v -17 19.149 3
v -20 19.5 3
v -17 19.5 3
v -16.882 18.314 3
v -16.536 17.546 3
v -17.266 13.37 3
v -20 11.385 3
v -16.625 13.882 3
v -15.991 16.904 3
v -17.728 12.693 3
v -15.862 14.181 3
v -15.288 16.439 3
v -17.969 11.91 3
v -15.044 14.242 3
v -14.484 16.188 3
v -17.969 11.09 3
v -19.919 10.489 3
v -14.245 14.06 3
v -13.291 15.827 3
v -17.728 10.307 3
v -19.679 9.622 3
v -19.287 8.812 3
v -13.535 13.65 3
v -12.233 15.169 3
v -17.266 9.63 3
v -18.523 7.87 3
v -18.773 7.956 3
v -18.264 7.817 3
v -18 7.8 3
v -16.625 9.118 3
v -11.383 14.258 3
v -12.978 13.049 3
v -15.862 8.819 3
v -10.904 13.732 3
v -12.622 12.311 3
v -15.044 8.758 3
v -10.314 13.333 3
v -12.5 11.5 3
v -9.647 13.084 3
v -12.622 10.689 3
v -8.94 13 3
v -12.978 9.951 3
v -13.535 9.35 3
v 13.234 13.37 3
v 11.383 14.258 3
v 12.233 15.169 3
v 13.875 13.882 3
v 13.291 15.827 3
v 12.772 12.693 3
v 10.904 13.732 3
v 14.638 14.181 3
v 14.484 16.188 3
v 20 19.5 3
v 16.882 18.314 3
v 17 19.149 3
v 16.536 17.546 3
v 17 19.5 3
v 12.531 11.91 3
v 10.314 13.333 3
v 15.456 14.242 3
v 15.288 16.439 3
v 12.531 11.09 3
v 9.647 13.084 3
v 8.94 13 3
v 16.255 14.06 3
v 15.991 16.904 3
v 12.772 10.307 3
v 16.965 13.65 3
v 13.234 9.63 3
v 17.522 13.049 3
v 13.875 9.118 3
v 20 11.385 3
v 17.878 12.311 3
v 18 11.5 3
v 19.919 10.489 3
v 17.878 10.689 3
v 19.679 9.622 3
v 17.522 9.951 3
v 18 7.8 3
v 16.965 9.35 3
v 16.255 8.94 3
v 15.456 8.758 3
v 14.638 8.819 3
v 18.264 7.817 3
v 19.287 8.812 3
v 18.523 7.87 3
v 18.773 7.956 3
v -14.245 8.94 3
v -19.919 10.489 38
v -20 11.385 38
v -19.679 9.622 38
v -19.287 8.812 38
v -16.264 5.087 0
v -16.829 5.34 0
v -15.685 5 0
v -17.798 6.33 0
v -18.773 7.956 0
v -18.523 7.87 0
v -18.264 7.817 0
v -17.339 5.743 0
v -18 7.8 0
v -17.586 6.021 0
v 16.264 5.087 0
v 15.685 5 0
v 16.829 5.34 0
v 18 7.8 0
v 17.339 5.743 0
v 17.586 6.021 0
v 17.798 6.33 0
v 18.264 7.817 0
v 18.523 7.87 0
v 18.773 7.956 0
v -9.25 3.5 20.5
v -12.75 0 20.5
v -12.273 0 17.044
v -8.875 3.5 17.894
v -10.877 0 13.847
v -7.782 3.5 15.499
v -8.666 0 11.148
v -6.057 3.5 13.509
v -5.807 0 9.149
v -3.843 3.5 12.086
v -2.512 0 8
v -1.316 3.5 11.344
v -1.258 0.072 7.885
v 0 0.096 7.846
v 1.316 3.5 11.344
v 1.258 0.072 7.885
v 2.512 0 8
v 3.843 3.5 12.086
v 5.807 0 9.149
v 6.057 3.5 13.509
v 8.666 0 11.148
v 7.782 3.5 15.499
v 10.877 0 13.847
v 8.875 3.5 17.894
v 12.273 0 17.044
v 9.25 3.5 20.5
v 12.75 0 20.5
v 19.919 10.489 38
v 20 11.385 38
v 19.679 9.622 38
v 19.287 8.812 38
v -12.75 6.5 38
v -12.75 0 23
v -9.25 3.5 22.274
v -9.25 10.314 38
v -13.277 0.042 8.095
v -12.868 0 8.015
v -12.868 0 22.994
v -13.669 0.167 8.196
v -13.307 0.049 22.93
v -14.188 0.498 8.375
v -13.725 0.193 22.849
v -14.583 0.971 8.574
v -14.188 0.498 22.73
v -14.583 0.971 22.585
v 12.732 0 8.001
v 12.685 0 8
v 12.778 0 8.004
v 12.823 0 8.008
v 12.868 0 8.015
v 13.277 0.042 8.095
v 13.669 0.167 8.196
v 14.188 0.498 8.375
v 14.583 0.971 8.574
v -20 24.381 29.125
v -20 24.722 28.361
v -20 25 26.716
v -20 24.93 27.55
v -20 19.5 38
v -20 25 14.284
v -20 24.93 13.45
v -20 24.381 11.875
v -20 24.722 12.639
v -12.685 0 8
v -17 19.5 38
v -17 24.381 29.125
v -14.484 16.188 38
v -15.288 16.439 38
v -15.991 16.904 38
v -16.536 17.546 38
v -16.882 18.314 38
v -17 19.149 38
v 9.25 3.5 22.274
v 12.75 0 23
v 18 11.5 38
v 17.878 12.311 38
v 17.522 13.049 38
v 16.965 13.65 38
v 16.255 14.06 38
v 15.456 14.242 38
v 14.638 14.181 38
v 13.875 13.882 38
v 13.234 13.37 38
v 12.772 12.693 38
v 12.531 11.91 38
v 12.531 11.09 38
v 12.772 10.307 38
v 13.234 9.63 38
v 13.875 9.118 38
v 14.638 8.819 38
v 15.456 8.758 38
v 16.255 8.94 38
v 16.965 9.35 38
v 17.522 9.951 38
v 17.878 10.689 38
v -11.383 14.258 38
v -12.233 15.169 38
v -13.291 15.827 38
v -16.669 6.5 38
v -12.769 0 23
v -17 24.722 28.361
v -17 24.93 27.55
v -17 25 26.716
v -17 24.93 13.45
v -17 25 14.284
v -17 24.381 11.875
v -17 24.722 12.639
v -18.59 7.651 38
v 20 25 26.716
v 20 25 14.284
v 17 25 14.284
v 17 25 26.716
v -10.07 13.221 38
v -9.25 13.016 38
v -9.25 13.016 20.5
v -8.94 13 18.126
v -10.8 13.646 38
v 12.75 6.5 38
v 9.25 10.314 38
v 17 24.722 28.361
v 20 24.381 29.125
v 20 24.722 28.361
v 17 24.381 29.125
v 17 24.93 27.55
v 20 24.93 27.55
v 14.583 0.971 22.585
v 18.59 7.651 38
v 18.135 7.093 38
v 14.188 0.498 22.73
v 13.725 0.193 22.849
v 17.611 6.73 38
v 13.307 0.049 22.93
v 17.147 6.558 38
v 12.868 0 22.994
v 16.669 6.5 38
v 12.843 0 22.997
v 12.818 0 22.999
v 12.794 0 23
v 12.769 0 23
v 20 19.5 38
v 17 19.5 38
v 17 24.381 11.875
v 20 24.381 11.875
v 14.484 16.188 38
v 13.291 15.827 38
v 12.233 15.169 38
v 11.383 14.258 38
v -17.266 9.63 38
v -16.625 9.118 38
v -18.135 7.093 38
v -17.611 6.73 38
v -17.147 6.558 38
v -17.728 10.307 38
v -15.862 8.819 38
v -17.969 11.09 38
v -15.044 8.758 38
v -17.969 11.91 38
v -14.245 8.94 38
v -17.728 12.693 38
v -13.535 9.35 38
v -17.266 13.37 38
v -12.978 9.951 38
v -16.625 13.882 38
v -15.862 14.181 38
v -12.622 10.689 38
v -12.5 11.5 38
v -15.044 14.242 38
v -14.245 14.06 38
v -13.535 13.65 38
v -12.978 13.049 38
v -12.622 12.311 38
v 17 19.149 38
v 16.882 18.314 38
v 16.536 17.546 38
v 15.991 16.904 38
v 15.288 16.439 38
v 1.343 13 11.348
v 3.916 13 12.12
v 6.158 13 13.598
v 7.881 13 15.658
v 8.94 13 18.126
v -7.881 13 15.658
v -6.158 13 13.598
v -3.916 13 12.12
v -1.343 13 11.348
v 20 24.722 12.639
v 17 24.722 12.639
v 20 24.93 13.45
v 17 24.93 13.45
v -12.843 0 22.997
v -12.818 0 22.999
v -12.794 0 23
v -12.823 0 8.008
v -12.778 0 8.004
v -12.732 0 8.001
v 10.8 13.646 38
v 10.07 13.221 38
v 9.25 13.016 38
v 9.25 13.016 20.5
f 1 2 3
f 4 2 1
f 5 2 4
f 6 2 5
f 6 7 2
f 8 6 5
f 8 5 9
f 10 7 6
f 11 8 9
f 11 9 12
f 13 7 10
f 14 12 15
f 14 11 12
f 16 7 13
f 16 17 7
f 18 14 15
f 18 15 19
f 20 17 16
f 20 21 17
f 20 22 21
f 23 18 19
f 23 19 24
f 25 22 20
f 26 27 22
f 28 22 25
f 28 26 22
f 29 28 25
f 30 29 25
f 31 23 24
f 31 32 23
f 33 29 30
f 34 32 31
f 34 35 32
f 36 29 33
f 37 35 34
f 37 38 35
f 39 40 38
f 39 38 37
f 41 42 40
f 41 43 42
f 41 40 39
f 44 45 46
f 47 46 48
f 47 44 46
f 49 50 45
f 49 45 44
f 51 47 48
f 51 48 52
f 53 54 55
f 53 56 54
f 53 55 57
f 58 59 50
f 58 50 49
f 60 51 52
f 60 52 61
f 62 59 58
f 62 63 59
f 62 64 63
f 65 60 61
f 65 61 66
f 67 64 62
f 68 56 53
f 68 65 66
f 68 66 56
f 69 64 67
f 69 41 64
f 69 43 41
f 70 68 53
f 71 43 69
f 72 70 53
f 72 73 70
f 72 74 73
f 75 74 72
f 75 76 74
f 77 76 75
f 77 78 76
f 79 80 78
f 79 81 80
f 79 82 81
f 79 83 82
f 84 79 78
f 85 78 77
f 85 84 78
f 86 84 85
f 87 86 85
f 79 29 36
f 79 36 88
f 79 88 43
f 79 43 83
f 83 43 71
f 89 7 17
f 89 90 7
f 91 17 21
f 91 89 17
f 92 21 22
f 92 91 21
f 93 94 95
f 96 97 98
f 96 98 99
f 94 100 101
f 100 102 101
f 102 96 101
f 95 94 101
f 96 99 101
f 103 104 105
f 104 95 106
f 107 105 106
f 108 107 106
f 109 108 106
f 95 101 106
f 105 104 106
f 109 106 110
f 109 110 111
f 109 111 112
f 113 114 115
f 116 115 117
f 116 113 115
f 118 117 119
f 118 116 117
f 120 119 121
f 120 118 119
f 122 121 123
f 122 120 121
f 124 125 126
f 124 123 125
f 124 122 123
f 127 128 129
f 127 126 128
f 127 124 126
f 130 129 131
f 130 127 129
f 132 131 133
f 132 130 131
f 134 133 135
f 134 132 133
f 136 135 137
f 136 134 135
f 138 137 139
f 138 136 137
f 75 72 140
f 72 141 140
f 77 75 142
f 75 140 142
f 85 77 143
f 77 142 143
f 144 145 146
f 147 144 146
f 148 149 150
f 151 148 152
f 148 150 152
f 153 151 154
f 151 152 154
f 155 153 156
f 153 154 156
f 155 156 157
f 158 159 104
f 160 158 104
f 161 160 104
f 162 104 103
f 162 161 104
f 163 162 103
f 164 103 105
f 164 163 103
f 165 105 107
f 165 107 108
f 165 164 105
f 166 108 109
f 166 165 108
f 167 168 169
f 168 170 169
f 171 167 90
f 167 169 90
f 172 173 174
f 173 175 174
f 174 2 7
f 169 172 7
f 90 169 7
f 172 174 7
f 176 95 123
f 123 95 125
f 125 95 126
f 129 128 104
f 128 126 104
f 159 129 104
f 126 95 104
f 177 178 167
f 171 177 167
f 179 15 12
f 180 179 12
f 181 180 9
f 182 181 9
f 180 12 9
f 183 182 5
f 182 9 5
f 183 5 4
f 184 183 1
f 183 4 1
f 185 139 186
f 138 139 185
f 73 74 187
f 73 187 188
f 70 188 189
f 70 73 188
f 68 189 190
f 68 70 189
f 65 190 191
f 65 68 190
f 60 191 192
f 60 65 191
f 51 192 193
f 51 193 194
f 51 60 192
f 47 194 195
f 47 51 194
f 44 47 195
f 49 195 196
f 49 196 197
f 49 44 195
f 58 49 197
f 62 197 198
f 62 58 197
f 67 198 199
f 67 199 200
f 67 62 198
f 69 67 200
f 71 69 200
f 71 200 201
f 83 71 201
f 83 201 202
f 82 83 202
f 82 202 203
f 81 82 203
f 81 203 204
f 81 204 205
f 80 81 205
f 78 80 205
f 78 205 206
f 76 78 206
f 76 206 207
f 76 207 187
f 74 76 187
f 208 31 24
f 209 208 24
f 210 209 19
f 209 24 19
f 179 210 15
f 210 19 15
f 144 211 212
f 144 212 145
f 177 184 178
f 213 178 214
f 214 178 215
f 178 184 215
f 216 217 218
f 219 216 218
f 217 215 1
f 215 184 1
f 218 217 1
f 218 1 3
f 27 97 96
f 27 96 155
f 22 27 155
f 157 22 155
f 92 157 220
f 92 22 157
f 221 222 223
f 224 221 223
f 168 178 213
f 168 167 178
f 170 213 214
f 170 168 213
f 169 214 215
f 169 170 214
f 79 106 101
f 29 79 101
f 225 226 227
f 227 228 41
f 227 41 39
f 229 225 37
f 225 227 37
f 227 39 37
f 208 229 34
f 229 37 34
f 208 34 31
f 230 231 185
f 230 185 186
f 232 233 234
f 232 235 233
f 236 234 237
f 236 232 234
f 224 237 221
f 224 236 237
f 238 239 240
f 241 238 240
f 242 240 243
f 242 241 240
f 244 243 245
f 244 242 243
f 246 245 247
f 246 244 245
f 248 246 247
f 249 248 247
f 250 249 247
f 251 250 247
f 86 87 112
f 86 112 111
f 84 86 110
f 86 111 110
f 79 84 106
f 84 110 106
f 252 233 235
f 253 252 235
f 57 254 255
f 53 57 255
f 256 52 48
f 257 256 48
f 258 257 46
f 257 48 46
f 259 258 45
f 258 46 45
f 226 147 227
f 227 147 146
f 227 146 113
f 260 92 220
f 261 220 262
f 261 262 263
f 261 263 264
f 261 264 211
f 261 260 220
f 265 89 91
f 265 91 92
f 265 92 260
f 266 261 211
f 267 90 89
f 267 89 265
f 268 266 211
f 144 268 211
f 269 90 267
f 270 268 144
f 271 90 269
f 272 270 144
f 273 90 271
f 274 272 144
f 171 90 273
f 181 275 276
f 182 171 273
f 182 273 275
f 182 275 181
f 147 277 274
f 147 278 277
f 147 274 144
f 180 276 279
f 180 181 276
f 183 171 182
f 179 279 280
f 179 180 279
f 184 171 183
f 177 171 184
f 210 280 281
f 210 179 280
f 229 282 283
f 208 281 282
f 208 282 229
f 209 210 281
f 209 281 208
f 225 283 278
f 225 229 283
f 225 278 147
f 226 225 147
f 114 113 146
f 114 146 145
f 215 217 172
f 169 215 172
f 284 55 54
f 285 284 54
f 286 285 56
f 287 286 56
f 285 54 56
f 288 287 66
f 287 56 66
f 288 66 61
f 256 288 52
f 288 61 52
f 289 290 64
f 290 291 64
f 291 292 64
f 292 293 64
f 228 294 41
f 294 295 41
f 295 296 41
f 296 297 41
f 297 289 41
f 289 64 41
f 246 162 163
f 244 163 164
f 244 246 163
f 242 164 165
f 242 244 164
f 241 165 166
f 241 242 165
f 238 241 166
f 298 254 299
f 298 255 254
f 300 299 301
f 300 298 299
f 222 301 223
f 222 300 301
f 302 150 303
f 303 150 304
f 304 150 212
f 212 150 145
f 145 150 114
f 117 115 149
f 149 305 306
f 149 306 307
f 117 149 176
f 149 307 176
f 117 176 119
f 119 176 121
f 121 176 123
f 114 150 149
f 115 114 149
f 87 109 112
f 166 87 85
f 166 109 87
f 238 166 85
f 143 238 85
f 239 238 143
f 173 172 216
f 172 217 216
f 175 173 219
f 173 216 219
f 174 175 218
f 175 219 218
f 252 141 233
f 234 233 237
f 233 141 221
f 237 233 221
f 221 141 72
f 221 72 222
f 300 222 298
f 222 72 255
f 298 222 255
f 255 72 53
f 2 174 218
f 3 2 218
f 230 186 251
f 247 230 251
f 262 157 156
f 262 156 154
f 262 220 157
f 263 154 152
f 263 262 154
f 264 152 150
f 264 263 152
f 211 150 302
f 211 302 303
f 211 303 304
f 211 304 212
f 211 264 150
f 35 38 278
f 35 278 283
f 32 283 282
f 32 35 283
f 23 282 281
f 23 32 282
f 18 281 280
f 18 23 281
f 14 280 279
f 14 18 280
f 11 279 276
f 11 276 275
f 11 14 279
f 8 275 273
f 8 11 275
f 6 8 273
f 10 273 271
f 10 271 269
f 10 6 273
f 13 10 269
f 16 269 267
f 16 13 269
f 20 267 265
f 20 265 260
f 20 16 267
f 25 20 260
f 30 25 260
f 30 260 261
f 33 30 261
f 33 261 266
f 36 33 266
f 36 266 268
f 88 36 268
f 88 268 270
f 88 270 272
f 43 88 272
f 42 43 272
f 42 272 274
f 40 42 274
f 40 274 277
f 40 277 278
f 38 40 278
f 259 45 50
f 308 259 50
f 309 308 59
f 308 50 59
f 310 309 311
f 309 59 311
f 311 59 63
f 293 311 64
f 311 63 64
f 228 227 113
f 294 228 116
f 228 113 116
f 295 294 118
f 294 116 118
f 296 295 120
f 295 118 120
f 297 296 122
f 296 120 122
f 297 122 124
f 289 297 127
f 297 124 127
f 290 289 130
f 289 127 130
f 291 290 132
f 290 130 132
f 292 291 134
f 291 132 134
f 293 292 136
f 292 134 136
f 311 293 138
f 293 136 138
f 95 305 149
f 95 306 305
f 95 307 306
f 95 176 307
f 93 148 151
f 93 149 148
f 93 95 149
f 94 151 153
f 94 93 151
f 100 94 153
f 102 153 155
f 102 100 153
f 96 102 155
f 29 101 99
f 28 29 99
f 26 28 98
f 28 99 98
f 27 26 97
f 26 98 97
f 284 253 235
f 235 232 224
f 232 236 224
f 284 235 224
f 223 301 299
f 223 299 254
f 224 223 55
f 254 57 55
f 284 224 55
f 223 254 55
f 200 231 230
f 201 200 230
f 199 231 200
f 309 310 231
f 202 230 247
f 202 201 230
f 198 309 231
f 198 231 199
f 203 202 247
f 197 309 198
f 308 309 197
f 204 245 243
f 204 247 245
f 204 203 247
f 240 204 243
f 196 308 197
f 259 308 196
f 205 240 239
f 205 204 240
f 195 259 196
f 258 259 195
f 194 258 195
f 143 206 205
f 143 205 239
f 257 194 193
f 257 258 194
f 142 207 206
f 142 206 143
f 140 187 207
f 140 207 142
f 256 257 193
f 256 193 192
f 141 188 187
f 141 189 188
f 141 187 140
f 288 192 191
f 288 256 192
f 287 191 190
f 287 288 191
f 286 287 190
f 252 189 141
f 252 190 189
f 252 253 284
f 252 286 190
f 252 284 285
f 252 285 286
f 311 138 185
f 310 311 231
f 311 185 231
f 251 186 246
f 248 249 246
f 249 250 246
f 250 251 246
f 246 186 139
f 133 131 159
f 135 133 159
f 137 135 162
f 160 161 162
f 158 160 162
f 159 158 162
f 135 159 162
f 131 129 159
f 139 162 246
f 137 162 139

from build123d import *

# Parameters (mm, degrees)
F0_R         = 2.75
F1_DEPTH     = 38
F3_DEPTH     = 3
F5_DEPTH     = 25
F6_SIZE2     = 5
F6_SIZE      = 8
F7_SIZE2     = 6.5
F7_SIZE      = 15
F8_SIZE2     = 6
F8_SIZE      = 10
F9_SIZE2     = 10
F9_SIZE      = 6
F10_R        = 2
F11_C1_SIZE2 = 10
F11_C1_SIZE  = 5.5
F11_C2_SIZE2 = 10
F11_C2_SIZE  = 5.5
F12_SIZE2    = 5.5
F12_SIZE     = 10
F12_2_SIZE2  = 5.5
F12_2_SIZE   = 10
F13_R        = 5
F14_R        = 5
F15_T1_DEPTH = 34.34956364
F15_T3_DEPTH = 11.5008904579
F15_T6_ANGLE = 180


# Not quite as in the source:
# - a fillet or chamfer that OpenCascade refuses, or shapes differently, is made with other operations: its cross-section is extruded or revolved along the edge and cut away or added


with BuildPart() as f1:
    # F0 (on Top) → F1 (new body)
    with BuildSketch(Plane.XY):
        with BuildLine():
            Line((-17, 25), (-20, 25))
            Line((-20, 25), (-20, 0))
            Line((-20, 0), (20, 0))
            Line((20, 0), (20, 25))
            Line((20, 25), (17, 25))
            Line((17, 25), (17, 19.1485292704))
            ThreePointArc((17, 19.1485292704), (16.286002286, 17.205800893), (14.4838709677, 16.1878082625))
            ThreePointArc((14.4838709677, 16.1878082625), (12.7404153064, 15.5329250756), (11.3827554868, 14.2580645161))
            ThreePointArc((11.3827554868, 14.2580645161), (10.3140016776, 13.332997333), (8.9402852679, 13))
            Line((8.9402852679, 13), (-8.9402852679, 13))
            ThreePointArc((-8.9402852679, 13), (-10.3140016776, 13.332997333), (-11.3827554868, 14.2580645161))
            ThreePointArc((-11.3827554868, 14.2580645161), (-12.7404153064, 15.5329250756), (-14.4838709677, 16.1878082625))
            ThreePointArc((-14.4838709677, 16.1878082625), (-16.286002286, 17.205800893), (-17, 19.1485292704))
            Line((-17, 19.1485292704), (-17, 25))
        make_face()
        with Locations((-15.25, 11.5)):
            Circle(F0_R, mode=Mode.SUBTRACT)
        with Locations((15.25, 11.5)):
            Circle(F0_R, mode=Mode.SUBTRACT)
    extrude(amount=F1_DEPTH)

    # F2 (on face) → F3 (cut)
    with BuildSketch(Plane(origin=(0, 0, 0), x_dir=(1, 0, 0), z_dir=(0, 0, -1))):
        with BuildLine():
            Line((18, -7.8), (-18, -7.8))
            ThreePointArc((-18, -7.8), (-19.4142135624, -8.3857864376), (-20, -9.8))
            Line((-20, -9.8), (-20, -60))
            Line((-20, -60), (20, -60))
            Line((20, -60), (20, -9.8))
            ThreePointArc((20, -9.8), (19.4142135624, -8.3857864376), (18, -7.8))
        make_face()
    extrude(amount=-F3_DEPTH, mode=Mode.SUBTRACT)

    # F4 (on face) → F5 (cut)
    with BuildSketch(Plane.XZ):
        with BuildLine():
            Line((-9.25, 38), (-9.25, 20.5))
            ThreePointArc((-9.25, 20.5), (0, 11.25), (9.25, 20.5))
            Line((9.25, 20.5), (9.25, 38))
            Line((9.25, 38), (-9.25, 38))
        make_face()
    extrude(amount=-F5_DEPTH, mode=Mode.SUBTRACT)

    # F6
    f6_edges = [f1.edges().sort_by_distance(p)[0] for p in [
        (0, 0, 0),
    ]]
    f6_side = f1.faces().sort_by_distance((0, 0, 0.551725))[0]
    chamfer(f6_edges, length=F6_SIZE, length2=F6_SIZE2, reference=f6_side)

    # F7
    f7_edges = [f1.edges().sort_by_distance(p)[0] for p in [
        (-14.625, 0, 38),
        (14.625, 0, 38),
    ]]
    f7_side = f1.faces().sort_by_distance((19.5, 0, 23))[0]
    chamfer(f7_edges, length=F7_SIZE, length2=F7_SIZE2, reference=f7_side)

    # F8
    f8_edges = [f1.edges().sort_by_distance(p)[0] for p in [
        (20, 0, 15.5),
    ]]
    f8_side = f1.faces().sort_by_distance((20, 13.094719, 19.529129))[0]
    chamfer(f8_edges, length=F8_SIZE, length2=F8_SIZE2, reference=f8_side)

    # F9
    f9_edges = [f1.edges().sort_by_distance(p)[0] for p in [
        (-20, 0, 15.5),
    ]]
    f9_side = f1.faces().sort_by_distance((11.625, 0, 22.628382))[0]
    chamfer(f9_edges, length=F9_SIZE, length2=F9_SIZE2, reference=f9_side)

    # F10
    f10_edges = [f1.edges().sort_by_distance(p)[0] for p in [
        (15.95, 3.25, 30.5),
        (-15.95, 3.25, 30.5),
        (14, 0, 15.5),
        (-14, 0, 15.5),
        (-15.5, 2.5, 4),
        (15.5, 2.5, 4),
    ]]
    fillet(f10_edges, radius=F10_R)

    # F11: chamfer of 10 x 5.5 on 2 edges, made by hand

    # F11_c1
    f11_c1_edges = [f1.edges().sort_by_distance(p)[0] for p in [
        (-18.5, 25, 3),
    ]]
    f11_c1_side = f1.faces().sort_by_distance((-18.5, 24.89, 3))[0]
    chamfer(f11_c1_edges, length=F11_C1_SIZE, length2=F11_C1_SIZE2, reference=f11_c1_side)

    # F11_c2
    f11_c2_edges = [f1.edges().sort_by_distance(p)[0] for p in [
        (18.5, 25, 3),
    ]]
    f11_c2_side = f1.faces().sort_by_distance((18.5, 24.89, 3))[0]
    chamfer(f11_c2_edges, length=F11_C2_SIZE, length2=F11_C2_SIZE2, reference=f11_c2_side)

    # F12
    f12_edges = [f1.edges().sort_by_distance(p)[0] for p in [
        (18.5, 25, 38),
    ]]
    f12_side = f1.faces().sort_by_distance((18.5, 25, 25.5))[0]
    chamfer(f12_edges, length=F12_SIZE, length2=F12_SIZE2, reference=f12_side)

    # F12#2
    f12_2_edges = [f1.edges().sort_by_distance(p)[0] for p in [
        (-18.5, 25, 38),
    ]]
    f12_2_side = f1.faces().sort_by_distance((-18.5, 25, 25.5))[0]
    chamfer(f12_2_edges, length=F12_2_SIZE, length2=F12_2_SIZE2, reference=f12_2_side)

    # F13
    f13_edges = [f1.edges().sort_by_distance(p)[0] for p in [
        (20, 10, 20.5),
        (-20, 10, 20.5),
    ]]
    fillet(f13_edges, radius=F13_R)

    # F14
    f14_edges = [f1.edges().sort_by_distance(p)[0] for p in [
        (18.5, 25, 28),
        (18.5, 25, 13),
        (-18.5, 25, 13),
        (-18.5, 25, 28),
    ]]
    fillet(f14_edges, radius=F14_R)

    # F15: chamfer of 3.5 on 5 edges, made by hand

    # F15_s2 → F15_t1 (cut)
    with BuildSketch(Plane(origin=(0, 4.8121986531, 11.1050738149), x_dir=(1, 0, 0), z_dir=(0, 0.3976074376, 0.9175556253))):
        Polygon((-12.75, -9.1449710656), (-9.25, -5.6449710656), (-9.25, -9.1449710656), align=None)
        Polygon((9.25, -5.6449710656), (12.75, -9.1449710656), (9.25, -9.1449710656), align=None)
    extrude(amount=F15_T1_DEPTH, mode=Mode.SUBTRACT)

    # F15_s4 → F15_t3 (cut)
    with BuildSketch(Plane.XY.offset(20.5)):
        Polygon((-9.25, 3.5), (-12.75, 0), (-9.25, 0), align=None)
        Polygon((12.75, 0), (9.25, 3.5), (9.25, 0), align=None)
    extrude(amount=F15_T3_DEPTH, mode=Mode.SUBTRACT)

    # F15_s5 → F15_t6 (revolve, cut)
    with BuildSketch(Plane.XY.offset(20.5)):
        Polygon((-12.75, 0), (-9.25, 3.5), (-9.25, 0), align=None)
    revolve(axis=Axis((0, 0, 20.5), (0, -1, 0)), revolution_arc=F15_T6_ANGLE, mode=Mode.SUBTRACT)


solid = f1.part
